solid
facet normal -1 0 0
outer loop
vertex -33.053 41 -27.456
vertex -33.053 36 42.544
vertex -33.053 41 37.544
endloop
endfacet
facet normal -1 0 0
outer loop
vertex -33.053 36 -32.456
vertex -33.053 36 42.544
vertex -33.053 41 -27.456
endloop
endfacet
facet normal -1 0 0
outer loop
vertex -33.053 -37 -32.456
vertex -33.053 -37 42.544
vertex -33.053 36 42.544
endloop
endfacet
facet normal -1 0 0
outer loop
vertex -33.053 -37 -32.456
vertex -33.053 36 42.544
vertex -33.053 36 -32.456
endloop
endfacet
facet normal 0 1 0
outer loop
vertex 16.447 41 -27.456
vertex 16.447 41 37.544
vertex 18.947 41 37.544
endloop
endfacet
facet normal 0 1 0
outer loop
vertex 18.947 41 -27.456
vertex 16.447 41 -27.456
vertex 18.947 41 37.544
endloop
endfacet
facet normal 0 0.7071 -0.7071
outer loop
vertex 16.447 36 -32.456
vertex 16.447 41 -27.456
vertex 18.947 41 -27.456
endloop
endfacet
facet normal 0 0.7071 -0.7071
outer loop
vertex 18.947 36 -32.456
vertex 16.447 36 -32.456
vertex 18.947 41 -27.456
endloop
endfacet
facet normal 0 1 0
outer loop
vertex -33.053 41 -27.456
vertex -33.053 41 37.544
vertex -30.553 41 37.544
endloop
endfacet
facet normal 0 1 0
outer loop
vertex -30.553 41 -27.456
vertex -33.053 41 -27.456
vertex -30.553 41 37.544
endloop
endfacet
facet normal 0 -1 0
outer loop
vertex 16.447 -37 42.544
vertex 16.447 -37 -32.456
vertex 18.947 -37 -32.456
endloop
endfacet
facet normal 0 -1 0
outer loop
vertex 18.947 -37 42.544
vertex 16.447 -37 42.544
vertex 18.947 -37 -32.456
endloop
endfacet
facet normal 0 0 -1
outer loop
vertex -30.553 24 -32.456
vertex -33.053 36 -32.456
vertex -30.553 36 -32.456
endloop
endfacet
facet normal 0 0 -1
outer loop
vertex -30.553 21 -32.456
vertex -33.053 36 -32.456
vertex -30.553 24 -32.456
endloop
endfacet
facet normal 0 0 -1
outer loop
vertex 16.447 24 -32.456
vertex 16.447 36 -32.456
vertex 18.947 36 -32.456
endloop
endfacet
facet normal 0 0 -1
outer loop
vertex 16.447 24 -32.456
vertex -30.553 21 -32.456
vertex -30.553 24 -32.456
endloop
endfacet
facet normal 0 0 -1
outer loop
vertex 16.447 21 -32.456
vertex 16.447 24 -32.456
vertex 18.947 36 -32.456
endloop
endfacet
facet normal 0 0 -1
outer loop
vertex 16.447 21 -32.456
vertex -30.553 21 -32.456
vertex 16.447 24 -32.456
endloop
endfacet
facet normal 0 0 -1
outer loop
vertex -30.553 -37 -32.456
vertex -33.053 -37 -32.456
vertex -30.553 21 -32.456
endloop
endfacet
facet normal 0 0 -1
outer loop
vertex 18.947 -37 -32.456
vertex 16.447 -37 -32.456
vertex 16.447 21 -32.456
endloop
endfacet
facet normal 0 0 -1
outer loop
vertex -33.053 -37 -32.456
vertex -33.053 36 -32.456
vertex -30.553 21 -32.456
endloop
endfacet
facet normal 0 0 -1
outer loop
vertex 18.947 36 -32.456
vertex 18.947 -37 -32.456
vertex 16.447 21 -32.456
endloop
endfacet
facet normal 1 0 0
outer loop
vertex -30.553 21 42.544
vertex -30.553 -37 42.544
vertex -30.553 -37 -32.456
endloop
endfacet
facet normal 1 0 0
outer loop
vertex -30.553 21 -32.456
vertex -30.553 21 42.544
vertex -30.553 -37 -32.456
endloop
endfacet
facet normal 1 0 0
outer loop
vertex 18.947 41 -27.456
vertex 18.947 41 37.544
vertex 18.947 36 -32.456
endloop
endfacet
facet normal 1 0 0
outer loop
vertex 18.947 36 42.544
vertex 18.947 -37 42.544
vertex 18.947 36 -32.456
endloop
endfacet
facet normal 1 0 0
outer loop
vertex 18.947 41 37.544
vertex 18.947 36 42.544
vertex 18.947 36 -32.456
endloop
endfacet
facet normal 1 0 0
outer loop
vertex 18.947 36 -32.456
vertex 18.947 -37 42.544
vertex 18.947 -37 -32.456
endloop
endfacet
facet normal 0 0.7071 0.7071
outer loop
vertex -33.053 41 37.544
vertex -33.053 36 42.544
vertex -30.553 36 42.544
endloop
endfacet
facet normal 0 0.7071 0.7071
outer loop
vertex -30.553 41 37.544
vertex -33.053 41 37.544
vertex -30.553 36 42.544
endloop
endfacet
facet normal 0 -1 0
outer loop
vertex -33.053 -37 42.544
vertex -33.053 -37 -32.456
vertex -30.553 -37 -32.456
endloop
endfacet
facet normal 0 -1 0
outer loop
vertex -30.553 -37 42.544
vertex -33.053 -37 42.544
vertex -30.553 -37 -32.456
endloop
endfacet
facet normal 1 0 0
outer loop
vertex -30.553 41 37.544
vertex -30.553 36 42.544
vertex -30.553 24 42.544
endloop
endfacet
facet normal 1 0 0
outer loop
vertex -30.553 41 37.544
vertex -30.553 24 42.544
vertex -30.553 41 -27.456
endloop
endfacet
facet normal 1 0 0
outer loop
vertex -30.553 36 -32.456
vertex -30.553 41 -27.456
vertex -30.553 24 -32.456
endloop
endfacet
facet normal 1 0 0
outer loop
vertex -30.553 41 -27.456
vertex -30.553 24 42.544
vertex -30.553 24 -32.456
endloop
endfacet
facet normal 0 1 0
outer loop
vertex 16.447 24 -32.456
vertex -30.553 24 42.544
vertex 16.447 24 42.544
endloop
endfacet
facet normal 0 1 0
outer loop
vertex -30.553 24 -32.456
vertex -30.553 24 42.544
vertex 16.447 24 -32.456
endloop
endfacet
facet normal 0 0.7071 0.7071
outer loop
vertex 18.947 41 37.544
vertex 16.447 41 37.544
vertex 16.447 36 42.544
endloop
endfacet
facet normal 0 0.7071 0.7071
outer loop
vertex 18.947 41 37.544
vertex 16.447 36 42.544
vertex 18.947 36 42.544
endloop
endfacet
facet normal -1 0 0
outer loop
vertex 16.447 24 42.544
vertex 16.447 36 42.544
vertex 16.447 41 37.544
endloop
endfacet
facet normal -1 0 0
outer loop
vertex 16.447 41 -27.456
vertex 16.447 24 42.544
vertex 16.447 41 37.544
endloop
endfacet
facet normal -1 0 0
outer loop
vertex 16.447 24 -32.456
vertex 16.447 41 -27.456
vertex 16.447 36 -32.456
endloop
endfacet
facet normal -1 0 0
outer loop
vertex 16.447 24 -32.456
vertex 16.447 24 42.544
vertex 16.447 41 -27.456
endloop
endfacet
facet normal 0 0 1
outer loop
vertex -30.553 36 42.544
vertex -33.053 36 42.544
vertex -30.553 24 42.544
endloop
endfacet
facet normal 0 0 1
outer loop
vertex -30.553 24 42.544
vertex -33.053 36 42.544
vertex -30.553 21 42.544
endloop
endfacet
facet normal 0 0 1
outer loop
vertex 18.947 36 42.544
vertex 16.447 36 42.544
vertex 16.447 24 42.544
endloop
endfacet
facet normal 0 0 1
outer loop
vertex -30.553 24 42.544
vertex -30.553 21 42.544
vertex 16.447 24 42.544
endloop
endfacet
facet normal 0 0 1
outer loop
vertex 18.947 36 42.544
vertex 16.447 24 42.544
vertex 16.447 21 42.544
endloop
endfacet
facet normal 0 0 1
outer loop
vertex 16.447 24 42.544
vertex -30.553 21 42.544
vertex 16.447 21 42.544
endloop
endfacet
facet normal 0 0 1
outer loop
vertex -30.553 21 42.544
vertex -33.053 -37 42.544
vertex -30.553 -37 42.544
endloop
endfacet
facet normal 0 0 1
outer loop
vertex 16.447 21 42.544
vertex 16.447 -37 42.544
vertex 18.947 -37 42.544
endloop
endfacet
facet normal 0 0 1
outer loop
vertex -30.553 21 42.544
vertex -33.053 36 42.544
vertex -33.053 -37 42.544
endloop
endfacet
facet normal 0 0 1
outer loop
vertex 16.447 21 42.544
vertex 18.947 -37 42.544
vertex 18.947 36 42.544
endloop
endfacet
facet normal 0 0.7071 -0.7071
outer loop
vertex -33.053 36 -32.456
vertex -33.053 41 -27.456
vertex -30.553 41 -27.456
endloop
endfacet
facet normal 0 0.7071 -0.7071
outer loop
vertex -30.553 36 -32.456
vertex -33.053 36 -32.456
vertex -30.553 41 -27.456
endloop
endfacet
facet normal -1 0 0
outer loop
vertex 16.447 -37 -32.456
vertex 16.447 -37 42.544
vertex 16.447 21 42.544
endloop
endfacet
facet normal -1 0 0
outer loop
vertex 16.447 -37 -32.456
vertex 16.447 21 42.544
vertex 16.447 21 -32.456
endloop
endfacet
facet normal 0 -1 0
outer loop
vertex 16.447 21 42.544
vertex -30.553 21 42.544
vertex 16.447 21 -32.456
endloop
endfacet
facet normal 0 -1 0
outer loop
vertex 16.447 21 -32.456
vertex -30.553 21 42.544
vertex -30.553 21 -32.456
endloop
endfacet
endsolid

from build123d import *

# Parameters (mm, degrees)
SKETCH1_W                = 52
SKETCH1_H                = 75
BOSS_EXTRUDE1_DEPTH      = 3
BOSS_EXTRUDE2_DEPTH      = 38
BOSS_EXTRUDE2_DEPTH_BACK = 40
SKETCH2_W                = 2.5
SKETCH2_H                = 75
SKETCH5_W                = 75
SKETCH5_H                = 3
BOSS_EXTRUDE5_DEPTH      = 47
CUT_EXTRUDE1_DEPTH       = 92.643201899
CUT_EXTRUDE1_DEPTH_BACK  = 92.643201899
SKETCH6_W                = 47
SKETCH6_H                = 3
CHAMFER1_SIZE            = 5


with BuildPart() as part:
    # Sketch1 → Boss-Extrude1 (new body)
    with BuildSketch(Plane(origin=(0, 0, 0), x_dir=(1, 0, 0), z_dir=(0, 1, 0))):
        with Locations((-7.052631579, -5.043859649)):
            Rectangle(SKETCH1_W, SKETCH1_H)
    extrude(amount=BOSS_EXTRUDE1_DEPTH)

    # Sketch2 → Boss-Extrude2 (add, two sides: drawn at the far end of the back side and taken through both)
    with BuildSketch(Plane(origin=(0, 3, 0), x_dir=(1, 0, 0), z_dir=(0, 1, 0)).offset(-BOSS_EXTRUDE2_DEPTH_BACK)):
        with Locations((-31.802631579, -5.043859649)):
            Rectangle(SKETCH2_W, SKETCH2_H)
        with Locations((17.697368421, -5.043859649)):
            Rectangle(SKETCH2_W, SKETCH2_H)
    extrude(amount=BOSS_EXTRUDE2_DEPTH + BOSS_EXTRUDE2_DEPTH_BACK)

    # Sketch5 → Boss-Extrude5 (add)
    with BuildSketch(Plane(origin=(-30.552631579, 0, 0), x_dir=(0, 0, -1), z_dir=(1, 0, 0))):
        with Locations((-5.043859649, 22.5)):
            Rectangle(SKETCH5_W, SKETCH5_H)
    extrude(amount=BOSS_EXTRUDE5_DEPTH)

    # Sketch6 → Cut-Extrude1 (cut, two sides: drawn at the far end of the back side and taken through both)
    with BuildSketch(Plane.XY.offset(42.543859649).offset(-CUT_EXTRUDE1_DEPTH_BACK)):
        with Locations((-7.052631579, 1.5)):
            Rectangle(SKETCH6_W, SKETCH6_H)
    extrude(amount=CUT_EXTRUDE1_DEPTH + CUT_EXTRUDE1_DEPTH_BACK, mode=Mode.SUBTRACT)

    # Chamfer1
    chamfer1_edges = [part.edges().sort_by_distance(p)[0] for p in [
        (-31.802631579, 41, 42.543859649),
        (-31.802631579, 41, -32.456140351),
        (17.697368421, 41, -32.456140351),
        (17.697368421, 41, 42.543859649),
    ]]
    chamfer(chamfer1_edges, length=CHAMFER1_SIZE)


solid = part.part
